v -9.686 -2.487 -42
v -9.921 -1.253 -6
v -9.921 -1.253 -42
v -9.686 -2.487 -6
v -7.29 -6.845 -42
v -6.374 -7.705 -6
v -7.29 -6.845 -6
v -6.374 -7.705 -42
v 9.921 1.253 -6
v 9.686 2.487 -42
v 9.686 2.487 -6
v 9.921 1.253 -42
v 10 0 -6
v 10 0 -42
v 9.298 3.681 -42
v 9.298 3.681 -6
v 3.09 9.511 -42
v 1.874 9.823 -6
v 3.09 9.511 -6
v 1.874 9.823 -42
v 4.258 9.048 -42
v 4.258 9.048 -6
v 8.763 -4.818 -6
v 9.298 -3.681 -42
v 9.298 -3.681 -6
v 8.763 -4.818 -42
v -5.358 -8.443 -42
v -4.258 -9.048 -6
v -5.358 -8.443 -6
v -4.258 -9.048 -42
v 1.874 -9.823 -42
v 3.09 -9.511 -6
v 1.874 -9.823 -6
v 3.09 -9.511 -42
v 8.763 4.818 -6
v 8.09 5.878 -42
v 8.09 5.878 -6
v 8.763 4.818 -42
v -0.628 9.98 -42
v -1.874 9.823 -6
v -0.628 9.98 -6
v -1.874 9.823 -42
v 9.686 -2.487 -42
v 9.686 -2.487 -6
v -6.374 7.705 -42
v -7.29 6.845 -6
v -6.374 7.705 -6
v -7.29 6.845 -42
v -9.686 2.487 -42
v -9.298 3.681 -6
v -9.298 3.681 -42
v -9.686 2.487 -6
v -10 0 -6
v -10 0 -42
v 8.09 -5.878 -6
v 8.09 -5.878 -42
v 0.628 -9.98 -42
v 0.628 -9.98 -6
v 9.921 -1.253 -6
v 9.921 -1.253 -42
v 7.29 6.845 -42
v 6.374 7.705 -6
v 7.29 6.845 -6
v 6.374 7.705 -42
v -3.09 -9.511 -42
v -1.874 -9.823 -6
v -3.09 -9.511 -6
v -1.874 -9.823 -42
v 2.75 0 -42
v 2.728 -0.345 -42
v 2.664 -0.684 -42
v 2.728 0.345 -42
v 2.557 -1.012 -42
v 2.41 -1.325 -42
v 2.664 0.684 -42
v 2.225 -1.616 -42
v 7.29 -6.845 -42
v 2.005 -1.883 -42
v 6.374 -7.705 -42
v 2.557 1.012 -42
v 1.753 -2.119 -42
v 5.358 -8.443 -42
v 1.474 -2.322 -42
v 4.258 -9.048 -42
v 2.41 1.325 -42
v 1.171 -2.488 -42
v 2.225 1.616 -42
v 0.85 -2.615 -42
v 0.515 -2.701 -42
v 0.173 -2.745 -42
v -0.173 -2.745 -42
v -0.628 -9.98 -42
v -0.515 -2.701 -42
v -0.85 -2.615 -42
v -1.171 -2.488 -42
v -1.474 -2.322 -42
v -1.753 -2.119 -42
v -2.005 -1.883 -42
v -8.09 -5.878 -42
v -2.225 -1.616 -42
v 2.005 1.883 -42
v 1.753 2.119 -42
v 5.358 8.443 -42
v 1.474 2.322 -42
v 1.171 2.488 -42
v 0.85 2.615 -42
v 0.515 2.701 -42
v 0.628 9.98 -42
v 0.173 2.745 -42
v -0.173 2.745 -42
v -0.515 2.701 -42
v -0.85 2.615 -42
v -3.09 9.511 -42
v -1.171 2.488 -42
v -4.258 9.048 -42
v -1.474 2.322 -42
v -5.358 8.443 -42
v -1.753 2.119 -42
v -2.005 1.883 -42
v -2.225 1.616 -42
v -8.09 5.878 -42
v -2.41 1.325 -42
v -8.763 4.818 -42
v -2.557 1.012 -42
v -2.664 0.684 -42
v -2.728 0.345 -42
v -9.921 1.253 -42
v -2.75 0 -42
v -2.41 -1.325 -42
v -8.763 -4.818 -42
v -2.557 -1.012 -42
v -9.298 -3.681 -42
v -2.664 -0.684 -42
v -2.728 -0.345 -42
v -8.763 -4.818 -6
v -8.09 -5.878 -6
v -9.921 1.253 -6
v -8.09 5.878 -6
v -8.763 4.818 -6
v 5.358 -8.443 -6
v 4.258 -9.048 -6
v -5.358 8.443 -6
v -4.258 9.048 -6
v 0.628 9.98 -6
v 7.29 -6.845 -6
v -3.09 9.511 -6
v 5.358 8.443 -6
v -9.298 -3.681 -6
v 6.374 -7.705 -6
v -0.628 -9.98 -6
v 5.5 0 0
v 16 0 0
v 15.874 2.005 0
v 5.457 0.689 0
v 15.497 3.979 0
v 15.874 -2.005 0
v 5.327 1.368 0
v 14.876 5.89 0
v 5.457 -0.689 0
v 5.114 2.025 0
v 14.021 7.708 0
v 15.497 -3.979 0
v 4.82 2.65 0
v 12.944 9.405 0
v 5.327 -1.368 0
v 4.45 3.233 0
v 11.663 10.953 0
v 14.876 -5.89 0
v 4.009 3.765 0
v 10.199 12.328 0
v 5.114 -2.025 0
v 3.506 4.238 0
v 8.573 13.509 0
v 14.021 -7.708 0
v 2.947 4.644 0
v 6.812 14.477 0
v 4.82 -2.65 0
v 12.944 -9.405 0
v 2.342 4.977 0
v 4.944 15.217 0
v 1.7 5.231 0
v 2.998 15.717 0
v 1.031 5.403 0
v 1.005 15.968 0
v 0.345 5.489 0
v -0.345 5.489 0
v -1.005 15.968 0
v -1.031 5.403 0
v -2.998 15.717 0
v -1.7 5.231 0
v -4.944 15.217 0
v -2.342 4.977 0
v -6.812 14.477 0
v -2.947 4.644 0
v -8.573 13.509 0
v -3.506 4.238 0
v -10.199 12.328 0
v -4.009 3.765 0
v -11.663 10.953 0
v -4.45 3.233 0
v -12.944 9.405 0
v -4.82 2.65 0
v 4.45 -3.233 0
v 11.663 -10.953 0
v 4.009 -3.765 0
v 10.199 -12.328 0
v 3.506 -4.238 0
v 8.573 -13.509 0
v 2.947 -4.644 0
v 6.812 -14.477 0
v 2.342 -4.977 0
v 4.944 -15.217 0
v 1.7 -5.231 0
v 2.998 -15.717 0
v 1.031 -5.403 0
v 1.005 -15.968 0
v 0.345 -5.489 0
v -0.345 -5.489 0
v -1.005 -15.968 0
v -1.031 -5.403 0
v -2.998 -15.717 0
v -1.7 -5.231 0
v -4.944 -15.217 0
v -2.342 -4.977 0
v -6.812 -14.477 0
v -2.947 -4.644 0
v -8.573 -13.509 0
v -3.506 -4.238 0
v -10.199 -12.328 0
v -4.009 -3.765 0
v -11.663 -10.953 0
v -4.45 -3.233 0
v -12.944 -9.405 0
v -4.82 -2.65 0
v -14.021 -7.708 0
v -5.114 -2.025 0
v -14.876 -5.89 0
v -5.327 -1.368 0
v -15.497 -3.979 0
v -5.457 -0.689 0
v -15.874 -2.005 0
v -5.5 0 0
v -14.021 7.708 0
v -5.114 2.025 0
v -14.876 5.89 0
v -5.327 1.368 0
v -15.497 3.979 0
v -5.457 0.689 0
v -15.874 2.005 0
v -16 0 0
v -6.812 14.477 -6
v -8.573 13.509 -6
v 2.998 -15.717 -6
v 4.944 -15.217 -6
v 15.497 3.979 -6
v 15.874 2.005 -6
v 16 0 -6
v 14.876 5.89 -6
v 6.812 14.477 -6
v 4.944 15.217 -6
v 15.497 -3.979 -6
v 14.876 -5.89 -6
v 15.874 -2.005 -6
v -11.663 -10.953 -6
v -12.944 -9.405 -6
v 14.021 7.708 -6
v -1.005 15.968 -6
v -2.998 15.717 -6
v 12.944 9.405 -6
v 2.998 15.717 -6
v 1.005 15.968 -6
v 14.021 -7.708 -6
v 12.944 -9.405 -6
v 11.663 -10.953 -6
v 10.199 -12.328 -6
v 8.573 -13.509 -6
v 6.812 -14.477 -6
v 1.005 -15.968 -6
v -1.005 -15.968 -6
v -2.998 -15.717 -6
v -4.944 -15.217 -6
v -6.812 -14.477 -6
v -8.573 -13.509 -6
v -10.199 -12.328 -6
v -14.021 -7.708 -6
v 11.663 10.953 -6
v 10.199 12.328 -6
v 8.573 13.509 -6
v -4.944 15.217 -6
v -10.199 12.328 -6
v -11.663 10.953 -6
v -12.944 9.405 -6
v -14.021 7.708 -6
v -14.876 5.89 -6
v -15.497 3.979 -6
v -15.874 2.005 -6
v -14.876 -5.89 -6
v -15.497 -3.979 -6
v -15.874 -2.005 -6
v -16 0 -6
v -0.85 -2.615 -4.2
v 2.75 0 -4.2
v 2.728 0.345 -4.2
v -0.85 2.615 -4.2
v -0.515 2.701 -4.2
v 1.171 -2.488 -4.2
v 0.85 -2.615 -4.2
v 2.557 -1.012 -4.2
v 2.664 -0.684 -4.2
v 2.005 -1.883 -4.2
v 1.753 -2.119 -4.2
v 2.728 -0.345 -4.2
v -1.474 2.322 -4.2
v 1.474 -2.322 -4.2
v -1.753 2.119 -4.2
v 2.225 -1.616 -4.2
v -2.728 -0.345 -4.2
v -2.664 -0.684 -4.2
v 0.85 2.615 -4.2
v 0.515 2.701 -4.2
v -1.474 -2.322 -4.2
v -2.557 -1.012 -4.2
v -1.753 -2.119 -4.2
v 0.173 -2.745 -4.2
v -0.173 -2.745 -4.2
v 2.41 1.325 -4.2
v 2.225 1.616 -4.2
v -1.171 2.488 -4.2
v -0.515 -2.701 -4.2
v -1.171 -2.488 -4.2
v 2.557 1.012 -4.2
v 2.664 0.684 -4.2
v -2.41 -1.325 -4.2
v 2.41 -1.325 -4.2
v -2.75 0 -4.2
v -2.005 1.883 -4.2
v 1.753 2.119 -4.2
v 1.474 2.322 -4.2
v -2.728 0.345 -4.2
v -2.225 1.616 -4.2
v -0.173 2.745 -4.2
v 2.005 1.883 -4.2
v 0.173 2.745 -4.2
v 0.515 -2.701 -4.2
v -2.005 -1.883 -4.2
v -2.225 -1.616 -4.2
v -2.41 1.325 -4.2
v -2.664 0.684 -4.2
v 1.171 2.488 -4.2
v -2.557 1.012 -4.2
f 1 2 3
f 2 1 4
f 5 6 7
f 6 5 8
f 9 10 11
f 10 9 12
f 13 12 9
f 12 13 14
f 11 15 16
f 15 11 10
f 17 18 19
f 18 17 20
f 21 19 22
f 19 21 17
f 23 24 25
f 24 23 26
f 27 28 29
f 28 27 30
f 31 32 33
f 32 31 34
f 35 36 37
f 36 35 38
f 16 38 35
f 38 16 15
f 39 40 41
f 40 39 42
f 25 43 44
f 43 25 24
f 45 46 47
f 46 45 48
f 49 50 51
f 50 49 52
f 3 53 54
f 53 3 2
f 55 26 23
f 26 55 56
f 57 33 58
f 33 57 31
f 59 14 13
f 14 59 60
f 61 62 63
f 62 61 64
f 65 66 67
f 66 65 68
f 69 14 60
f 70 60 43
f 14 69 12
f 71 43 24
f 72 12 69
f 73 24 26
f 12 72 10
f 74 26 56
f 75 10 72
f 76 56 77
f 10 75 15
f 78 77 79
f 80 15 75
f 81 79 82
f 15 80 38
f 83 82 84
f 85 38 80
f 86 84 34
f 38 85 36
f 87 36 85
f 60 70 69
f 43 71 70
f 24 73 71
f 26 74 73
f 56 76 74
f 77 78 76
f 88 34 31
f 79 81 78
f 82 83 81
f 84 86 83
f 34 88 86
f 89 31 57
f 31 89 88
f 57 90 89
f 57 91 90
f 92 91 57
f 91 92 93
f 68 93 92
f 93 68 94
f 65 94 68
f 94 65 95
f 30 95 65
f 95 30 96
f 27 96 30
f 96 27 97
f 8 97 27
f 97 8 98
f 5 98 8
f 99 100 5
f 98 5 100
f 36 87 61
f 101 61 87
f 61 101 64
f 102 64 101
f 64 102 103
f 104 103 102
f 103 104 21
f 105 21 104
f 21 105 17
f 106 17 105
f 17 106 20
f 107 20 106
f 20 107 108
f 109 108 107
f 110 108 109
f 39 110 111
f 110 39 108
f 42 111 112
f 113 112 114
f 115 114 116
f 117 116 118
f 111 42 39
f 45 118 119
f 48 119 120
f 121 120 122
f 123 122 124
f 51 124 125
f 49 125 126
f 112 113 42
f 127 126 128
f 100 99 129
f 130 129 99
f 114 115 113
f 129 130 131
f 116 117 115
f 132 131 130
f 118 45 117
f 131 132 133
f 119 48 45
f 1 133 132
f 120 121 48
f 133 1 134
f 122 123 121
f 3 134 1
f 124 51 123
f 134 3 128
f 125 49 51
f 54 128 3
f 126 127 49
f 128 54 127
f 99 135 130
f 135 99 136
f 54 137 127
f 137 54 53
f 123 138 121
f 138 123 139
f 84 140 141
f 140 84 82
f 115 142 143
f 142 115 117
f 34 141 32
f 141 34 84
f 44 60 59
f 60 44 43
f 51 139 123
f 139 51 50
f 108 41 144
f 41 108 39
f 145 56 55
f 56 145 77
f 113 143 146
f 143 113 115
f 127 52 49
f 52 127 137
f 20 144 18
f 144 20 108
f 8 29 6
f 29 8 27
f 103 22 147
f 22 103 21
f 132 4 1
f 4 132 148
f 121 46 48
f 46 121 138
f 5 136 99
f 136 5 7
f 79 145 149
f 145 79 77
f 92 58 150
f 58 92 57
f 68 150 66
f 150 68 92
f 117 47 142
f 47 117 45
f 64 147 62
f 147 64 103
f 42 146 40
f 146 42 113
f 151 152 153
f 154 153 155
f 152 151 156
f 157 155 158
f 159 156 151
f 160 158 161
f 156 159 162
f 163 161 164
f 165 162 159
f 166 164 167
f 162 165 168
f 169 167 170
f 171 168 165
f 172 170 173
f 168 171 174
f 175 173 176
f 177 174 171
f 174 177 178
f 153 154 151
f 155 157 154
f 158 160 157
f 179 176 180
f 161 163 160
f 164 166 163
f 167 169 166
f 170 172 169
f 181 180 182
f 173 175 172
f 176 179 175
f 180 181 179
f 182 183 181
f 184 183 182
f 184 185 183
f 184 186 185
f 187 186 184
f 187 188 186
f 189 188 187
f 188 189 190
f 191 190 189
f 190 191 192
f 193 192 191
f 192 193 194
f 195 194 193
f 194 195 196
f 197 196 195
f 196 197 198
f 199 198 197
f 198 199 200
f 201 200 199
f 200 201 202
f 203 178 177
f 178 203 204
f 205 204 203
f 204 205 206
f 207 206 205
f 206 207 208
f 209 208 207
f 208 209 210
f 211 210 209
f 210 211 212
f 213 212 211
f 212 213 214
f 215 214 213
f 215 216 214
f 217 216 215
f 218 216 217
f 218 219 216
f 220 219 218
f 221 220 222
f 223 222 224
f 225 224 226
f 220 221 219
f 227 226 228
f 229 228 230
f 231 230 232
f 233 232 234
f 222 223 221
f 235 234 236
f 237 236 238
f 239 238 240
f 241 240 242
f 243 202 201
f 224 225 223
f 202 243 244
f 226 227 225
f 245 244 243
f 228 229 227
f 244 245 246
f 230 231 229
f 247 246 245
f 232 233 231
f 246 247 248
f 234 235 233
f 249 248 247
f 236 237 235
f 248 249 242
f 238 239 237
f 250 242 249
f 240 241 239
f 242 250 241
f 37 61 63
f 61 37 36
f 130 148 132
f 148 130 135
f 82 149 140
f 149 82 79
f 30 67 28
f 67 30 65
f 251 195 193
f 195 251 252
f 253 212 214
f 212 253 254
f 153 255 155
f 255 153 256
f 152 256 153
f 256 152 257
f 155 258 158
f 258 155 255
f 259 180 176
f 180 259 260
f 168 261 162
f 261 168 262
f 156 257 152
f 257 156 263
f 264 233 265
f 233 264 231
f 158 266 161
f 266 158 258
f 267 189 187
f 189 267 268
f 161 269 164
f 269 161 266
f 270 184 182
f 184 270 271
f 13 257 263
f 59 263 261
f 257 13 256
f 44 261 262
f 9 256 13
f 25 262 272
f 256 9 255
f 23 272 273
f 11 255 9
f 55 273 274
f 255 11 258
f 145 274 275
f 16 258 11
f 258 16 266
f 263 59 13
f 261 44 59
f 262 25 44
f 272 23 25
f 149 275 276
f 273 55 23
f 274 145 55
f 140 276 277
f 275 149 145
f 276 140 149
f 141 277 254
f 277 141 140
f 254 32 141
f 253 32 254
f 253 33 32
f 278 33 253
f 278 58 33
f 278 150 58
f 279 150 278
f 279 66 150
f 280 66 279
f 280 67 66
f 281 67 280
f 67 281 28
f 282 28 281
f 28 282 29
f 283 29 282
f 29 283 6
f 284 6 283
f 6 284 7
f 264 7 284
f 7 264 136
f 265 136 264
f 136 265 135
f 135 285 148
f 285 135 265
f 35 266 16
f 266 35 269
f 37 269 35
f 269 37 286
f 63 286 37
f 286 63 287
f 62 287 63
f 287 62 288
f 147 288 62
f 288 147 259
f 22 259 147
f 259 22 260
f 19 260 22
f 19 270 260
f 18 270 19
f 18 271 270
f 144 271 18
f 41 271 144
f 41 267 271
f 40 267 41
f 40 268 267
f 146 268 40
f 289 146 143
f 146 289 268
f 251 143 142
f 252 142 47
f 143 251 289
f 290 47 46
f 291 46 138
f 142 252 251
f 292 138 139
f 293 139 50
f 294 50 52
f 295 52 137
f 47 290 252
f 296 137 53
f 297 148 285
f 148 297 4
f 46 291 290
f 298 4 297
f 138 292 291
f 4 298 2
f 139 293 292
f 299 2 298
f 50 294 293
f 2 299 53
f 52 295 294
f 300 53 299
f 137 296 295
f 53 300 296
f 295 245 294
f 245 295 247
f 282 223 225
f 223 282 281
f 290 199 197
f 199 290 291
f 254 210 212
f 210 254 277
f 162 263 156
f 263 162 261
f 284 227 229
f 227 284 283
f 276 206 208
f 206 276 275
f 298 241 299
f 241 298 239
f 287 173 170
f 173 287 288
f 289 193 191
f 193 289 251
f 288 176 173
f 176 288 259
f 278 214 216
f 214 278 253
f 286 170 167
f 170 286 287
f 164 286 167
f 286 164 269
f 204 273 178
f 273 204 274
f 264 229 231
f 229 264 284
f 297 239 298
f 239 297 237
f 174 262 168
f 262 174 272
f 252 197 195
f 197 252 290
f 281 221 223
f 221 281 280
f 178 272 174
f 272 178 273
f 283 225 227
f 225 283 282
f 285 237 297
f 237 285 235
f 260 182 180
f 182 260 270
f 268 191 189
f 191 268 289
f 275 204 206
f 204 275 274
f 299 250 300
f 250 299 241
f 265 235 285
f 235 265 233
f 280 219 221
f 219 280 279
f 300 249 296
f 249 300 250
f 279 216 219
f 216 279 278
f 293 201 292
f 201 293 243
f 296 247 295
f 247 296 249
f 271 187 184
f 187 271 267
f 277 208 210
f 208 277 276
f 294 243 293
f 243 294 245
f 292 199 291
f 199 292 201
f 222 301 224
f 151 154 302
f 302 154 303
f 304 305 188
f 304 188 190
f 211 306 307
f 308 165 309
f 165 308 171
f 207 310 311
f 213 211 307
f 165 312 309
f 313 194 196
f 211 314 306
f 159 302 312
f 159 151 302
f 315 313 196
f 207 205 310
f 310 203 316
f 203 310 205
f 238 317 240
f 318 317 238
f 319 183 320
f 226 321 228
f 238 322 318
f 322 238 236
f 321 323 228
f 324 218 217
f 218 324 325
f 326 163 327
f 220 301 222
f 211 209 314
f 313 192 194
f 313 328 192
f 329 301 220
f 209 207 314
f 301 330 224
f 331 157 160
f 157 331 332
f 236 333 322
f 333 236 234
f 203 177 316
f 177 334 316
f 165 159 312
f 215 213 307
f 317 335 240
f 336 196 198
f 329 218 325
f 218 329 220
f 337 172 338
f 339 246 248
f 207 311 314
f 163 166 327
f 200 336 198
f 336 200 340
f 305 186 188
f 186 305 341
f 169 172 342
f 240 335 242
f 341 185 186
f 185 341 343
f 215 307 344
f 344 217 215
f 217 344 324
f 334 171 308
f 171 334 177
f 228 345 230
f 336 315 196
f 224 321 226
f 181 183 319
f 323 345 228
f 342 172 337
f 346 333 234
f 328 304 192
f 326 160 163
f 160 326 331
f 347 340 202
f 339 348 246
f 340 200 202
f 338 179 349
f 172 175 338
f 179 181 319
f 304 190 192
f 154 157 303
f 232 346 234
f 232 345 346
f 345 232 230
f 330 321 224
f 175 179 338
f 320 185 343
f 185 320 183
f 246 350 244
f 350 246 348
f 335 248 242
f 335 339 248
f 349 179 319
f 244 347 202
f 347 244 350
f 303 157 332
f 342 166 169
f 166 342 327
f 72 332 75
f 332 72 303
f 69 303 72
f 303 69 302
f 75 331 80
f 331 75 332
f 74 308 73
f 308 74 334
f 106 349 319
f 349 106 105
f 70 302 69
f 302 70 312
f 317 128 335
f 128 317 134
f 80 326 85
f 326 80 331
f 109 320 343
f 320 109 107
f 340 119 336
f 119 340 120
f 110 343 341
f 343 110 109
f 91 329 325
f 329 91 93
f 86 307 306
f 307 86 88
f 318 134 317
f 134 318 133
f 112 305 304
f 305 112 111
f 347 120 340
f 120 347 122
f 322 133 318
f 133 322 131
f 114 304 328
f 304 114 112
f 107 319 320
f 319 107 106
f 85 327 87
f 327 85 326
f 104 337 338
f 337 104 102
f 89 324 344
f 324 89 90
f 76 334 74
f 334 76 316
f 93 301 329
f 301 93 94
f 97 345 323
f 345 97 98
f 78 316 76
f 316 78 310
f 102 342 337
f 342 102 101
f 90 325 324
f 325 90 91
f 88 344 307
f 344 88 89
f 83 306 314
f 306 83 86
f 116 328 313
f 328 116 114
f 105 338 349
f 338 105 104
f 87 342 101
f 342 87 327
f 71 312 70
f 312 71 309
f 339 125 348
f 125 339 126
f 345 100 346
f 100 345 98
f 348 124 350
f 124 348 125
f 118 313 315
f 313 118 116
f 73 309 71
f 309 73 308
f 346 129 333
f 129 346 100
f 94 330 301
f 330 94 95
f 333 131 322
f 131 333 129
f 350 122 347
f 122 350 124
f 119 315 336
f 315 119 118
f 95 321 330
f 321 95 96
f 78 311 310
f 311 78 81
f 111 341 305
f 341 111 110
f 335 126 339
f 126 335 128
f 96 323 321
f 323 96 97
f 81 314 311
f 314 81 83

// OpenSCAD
$fn = 50;


difference() {
	union() {
		translate(v = [0, 0, -42.0000000000]) {
			cylinder(h = 42, r = 10.0000000000);
		}
		translate(v = [0, 0, -6.0000000000]) {
			cylinder(h = 6, r = 16.0000000000);
		}
	}
	union() {
		translate(v = [0, 0, 0]) {
			rotate(a = [0, 0, 0]) {
				difference() {
					union() {
						#translate(v = [0, 0, -42.0000000000]) {
							cylinder(h = 42, r = 2.2500000000);
						}
						#translate(v = [0, 0, -4.2000000000]) {
							cylinder(h = 4.2000000000, r = 10.0000000000, r1 = 2.7500000000, r2 = 5.5000000000);
						}
						#translate(v = [0, 0, -42.0000000000]) {
							cylinder(h = 42, r = 2.7500000000);
						}
						#translate(v = [0, 0, -42.0000000000]) {
							cylinder(h = 42, r = 2.2500000000);
						}
					}
					union();
				}
			}
		}
	}
}
